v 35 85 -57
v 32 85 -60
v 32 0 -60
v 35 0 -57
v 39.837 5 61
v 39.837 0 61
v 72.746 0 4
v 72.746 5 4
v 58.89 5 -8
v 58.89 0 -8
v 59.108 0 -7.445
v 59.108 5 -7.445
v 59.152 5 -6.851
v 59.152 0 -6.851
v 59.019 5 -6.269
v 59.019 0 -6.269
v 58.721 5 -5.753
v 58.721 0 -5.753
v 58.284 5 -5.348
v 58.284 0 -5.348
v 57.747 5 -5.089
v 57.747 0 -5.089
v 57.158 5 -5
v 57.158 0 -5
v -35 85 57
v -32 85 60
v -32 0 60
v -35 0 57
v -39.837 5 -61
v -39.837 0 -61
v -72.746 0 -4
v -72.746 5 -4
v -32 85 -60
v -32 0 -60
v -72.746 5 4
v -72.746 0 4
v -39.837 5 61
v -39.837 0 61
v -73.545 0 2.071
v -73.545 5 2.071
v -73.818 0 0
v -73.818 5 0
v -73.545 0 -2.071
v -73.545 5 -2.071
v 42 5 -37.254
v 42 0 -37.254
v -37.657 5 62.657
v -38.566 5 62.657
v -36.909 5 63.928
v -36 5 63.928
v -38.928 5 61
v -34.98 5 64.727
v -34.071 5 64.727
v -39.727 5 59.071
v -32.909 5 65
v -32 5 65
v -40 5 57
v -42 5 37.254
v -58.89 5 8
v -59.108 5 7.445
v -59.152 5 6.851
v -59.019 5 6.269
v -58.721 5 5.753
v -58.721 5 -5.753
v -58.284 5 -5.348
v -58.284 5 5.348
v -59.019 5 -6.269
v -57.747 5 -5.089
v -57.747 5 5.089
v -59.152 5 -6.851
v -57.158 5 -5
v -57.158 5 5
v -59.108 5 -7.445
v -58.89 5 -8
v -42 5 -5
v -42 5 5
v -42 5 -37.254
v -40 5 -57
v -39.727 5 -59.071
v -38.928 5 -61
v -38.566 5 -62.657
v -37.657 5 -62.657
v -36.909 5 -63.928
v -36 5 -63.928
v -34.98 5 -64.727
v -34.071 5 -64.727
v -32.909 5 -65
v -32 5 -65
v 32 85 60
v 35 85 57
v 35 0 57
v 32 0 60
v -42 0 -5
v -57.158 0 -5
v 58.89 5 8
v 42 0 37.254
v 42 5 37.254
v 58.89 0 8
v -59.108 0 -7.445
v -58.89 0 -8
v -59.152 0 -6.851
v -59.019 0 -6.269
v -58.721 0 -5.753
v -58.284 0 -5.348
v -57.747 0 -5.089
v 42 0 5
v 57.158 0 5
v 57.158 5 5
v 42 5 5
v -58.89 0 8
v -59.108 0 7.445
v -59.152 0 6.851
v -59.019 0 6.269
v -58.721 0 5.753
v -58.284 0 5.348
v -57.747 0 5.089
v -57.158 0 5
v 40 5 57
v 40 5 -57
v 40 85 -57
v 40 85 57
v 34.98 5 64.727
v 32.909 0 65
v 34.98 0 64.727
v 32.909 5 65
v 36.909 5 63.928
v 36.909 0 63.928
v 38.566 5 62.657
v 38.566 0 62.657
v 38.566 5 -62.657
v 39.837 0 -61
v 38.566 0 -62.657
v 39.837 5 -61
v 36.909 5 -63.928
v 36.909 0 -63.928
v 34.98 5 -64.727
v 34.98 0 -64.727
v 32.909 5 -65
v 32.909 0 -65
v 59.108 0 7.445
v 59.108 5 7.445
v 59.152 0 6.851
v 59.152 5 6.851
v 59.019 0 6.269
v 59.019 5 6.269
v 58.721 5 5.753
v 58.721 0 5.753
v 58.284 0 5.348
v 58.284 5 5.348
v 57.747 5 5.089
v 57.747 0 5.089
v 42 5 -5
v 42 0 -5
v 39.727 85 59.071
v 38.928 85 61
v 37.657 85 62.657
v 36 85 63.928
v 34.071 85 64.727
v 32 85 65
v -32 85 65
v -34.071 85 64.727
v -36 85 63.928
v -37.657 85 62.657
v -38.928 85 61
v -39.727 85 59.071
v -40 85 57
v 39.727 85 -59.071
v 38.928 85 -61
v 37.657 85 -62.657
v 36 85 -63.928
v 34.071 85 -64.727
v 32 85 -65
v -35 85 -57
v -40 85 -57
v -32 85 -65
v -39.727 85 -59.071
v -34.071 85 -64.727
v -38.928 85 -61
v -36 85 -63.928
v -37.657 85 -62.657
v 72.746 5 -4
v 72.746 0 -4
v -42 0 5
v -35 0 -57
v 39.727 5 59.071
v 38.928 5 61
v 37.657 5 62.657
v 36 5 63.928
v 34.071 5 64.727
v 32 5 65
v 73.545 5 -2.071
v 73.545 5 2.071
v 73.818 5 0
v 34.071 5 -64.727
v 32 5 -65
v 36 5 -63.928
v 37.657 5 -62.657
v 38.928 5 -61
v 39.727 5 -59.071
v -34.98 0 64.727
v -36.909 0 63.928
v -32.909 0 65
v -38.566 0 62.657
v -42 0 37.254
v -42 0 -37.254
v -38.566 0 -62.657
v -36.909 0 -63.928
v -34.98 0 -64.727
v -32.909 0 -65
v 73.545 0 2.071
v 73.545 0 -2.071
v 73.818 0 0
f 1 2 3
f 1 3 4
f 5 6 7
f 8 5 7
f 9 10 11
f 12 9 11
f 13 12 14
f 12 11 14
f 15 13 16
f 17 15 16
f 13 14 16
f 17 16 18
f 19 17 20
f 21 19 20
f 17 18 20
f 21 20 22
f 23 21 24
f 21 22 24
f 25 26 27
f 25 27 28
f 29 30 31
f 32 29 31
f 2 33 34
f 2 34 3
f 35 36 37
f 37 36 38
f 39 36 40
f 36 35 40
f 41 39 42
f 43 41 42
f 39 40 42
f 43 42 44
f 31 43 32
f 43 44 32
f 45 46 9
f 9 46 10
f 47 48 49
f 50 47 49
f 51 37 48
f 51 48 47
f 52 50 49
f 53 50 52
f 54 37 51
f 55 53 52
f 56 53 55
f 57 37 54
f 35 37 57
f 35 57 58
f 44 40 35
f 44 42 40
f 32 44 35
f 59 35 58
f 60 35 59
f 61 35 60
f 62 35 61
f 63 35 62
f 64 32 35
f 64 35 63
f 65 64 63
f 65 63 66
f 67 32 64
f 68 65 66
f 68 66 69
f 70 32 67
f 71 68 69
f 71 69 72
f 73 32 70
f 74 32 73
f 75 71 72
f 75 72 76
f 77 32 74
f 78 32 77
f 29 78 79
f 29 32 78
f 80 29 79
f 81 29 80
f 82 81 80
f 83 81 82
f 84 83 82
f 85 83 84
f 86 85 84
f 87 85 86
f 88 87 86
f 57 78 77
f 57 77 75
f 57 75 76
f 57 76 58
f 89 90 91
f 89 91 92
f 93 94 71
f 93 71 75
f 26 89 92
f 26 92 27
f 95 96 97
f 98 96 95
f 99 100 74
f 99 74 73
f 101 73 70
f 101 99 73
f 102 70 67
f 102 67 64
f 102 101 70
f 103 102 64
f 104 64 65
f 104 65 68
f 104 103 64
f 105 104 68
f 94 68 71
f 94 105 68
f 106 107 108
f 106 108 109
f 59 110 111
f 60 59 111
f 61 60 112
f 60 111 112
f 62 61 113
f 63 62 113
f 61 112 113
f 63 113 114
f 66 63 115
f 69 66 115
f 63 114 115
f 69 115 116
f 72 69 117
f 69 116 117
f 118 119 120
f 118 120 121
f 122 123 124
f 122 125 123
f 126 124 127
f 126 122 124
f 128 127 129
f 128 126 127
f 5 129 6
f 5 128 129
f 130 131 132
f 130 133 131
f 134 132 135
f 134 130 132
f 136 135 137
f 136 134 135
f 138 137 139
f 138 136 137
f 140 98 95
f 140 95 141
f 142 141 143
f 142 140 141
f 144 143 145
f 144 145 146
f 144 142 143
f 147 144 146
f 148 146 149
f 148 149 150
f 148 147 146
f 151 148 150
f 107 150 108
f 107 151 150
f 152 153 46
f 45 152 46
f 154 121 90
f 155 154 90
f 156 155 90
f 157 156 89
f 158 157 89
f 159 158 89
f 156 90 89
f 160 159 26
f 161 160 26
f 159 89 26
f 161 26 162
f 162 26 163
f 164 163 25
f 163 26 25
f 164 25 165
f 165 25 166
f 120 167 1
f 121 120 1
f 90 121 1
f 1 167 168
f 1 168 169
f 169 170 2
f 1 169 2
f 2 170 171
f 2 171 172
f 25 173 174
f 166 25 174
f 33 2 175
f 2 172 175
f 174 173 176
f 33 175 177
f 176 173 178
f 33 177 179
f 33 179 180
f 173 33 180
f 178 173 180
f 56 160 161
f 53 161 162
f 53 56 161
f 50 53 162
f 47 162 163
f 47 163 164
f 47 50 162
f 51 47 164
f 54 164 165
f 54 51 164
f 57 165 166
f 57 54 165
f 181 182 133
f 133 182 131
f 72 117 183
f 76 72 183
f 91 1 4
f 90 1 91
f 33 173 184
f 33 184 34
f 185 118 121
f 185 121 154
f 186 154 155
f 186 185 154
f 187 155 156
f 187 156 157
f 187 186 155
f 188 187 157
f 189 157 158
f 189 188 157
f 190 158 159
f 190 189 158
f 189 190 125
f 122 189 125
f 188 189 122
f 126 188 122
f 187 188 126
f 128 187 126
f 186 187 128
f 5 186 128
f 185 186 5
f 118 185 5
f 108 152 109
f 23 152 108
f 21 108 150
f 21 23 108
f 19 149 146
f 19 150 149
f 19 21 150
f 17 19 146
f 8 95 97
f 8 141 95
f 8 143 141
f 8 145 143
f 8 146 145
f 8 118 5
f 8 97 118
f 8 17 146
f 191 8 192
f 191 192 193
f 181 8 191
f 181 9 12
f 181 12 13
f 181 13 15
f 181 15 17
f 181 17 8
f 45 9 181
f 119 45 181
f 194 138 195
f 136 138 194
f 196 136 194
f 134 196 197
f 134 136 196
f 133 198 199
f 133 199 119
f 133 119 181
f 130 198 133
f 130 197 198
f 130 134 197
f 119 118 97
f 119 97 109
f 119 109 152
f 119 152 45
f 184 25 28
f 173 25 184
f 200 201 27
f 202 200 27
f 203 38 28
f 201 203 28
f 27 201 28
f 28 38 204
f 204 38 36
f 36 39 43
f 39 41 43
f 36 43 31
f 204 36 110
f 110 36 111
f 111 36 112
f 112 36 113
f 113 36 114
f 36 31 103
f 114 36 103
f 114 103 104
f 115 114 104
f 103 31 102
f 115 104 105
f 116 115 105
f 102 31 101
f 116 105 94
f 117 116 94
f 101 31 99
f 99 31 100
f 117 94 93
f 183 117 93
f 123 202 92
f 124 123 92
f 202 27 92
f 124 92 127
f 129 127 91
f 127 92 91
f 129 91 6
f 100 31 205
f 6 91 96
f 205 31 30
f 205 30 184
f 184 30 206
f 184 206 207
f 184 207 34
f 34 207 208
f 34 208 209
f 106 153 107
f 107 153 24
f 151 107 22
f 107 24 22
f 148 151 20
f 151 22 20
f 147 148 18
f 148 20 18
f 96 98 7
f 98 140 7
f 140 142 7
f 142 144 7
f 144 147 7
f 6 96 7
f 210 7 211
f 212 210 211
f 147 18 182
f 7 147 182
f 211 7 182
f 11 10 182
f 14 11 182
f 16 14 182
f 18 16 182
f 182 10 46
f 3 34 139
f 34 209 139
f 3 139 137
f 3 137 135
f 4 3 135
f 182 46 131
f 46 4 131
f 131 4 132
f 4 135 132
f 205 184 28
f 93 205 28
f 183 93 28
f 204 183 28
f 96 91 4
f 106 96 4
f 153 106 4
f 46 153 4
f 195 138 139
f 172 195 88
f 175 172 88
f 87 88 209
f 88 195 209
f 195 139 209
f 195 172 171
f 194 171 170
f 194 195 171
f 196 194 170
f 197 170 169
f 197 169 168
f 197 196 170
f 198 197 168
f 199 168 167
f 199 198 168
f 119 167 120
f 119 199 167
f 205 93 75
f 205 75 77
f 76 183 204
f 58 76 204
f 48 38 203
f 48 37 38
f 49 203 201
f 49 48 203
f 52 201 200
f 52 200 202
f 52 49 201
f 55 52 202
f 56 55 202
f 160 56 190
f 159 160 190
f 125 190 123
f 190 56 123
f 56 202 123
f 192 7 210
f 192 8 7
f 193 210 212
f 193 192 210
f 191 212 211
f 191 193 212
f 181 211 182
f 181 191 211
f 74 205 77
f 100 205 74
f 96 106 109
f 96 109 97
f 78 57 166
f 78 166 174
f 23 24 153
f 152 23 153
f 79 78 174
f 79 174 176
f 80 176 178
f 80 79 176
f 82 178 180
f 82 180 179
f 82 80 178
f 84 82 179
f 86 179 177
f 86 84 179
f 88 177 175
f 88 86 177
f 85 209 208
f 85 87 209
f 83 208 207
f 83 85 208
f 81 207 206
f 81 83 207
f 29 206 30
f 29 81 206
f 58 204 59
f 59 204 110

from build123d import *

# Parameters (mm, degrees)
BOSS_EXTRUDE1_DEPTH = 5
FILLET1_R           = 8
BOSS_EXTRUDE2_DEPTH = 80
CUT_EXTRUDE1_DEPTH  = 85
CUT_EXTRUDE2_DEPTH  = 5


with BuildPart() as part:
    # Sketch1 → Boss-Extrude1 (new body)
    with BuildSketch(Plane(origin=(0, 0, 0), x_dir=(1, 0, 0), z_dir=(0, 1, 0))):
        Polygon((-75.055534995, 0), (-37.527767497, -65), (37.527767497, -65), (75.055534995, 0), (37.527767497, 65), (-37.527767497, 65), align=None)
    extrude(amount=BOSS_EXTRUDE1_DEPTH)

    # Fillet1
    fillet1_edges = [part.edges().sort_by_distance(p)[0] for p in [
        (-37.527767497, 2.5, -65),
        (37.527767497, 2.5, -65),
        (75.055534995, 2.5, 0),
        (37.527767497, 2.5, 65),
        (-37.527767497, 2.5, 65),
        (-75.055534995, 2.5, 0),
    ]]
    fillet(fillet1_edges, radius=FILLET1_R)

    # Sketch3 → Boss-Extrude2 (add)
    with BuildSketch(Plane(origin=(0, 5, 0), x_dir=(1, 0, 0), z_dir=(0, 1, 0))):
        with BuildLine():
            Line((-32, 65), (32, 65))
            ThreePointArc((32, 65), (37.656854249, 62.656854249), (40, 57))
            Line((40, 57), (40, -57))
            ThreePointArc((40, -57), (37.656854249, -62.656854249), (32, -65))
            Line((32, -65), (-32, -65))
            ThreePointArc((-32, -65), (-37.656854249, -62.656854249), (-40, -57))
            Line((-40, -57), (-40, 57))
            ThreePointArc((-40, 57), (-37.656854249, 62.656854249), (-32, 65))
        make_face()
    extrude(amount=BOSS_EXTRUDE2_DEPTH)

    # Sketch4 → Cut-Extrude1 (cut)
    with BuildSketch(Plane(origin=(0, 85, 0), x_dir=(1, 0, 0), z_dir=(0, 1, 0))):
        Polygon((-35, 57), (-32, 60), (32, 60), (35, 57), (35, -57), (32, -60), (-32, -60), (-35, -57), align=None)
    extrude(amount=-CUT_EXTRUDE1_DEPTH, mode=Mode.SUBTRACT)

    # Sketch8 → Cut-Extrude2 (cut)
    with BuildSketch(Plane(origin=(0, 0, 0), x_dir=(1, 0, 0), z_dir=(0, 1, 0))):
        with BuildLine():
            ThreePointArc((58.889727457, 8), (58.889727457, 6), (57.15767665, 5))
            Line((57.15767665, 5), (42, 5))
            Line((42, 5), (42, 37.253866082))
            Line((42, 37.253866082), (58.889727457, 8))
        make_face()
        with BuildLine():
            Line((42, -37.253866082), (58.889727457, -8))
            ThreePointArc((58.889727457, -8), (58.889727457, -6), (57.15767665, -5))
            Line((57.15767665, -5), (42, -5))
            Line((42, -5), (42, -37.253866082))
        make_face()
        with BuildLine():
            ThreePointArc((-58.889727457, -8), (-58.889727457, -6), (-57.15767665, -5))
            Line((-57.15767665, -5), (-42, -5))
            Line((-42, -5), (-42, -37.253866082))
            Line((-42, -37.253866082), (-58.889727457, -8))
        make_face()
        with BuildLine():
            Line((-42, 37.253866082), (-58.889727457, 8))
            ThreePointArc((-58.889727457, 8), (-58.889727457, 6), (-57.15767665, 5))
            Line((-57.15767665, 5), (-42, 5))
            Line((-42, 5), (-42, 37.253866082))
        make_face()
    extrude(amount=CUT_EXTRUDE2_DEPTH, mode=Mode.SUBTRACT)


solid = part.part
